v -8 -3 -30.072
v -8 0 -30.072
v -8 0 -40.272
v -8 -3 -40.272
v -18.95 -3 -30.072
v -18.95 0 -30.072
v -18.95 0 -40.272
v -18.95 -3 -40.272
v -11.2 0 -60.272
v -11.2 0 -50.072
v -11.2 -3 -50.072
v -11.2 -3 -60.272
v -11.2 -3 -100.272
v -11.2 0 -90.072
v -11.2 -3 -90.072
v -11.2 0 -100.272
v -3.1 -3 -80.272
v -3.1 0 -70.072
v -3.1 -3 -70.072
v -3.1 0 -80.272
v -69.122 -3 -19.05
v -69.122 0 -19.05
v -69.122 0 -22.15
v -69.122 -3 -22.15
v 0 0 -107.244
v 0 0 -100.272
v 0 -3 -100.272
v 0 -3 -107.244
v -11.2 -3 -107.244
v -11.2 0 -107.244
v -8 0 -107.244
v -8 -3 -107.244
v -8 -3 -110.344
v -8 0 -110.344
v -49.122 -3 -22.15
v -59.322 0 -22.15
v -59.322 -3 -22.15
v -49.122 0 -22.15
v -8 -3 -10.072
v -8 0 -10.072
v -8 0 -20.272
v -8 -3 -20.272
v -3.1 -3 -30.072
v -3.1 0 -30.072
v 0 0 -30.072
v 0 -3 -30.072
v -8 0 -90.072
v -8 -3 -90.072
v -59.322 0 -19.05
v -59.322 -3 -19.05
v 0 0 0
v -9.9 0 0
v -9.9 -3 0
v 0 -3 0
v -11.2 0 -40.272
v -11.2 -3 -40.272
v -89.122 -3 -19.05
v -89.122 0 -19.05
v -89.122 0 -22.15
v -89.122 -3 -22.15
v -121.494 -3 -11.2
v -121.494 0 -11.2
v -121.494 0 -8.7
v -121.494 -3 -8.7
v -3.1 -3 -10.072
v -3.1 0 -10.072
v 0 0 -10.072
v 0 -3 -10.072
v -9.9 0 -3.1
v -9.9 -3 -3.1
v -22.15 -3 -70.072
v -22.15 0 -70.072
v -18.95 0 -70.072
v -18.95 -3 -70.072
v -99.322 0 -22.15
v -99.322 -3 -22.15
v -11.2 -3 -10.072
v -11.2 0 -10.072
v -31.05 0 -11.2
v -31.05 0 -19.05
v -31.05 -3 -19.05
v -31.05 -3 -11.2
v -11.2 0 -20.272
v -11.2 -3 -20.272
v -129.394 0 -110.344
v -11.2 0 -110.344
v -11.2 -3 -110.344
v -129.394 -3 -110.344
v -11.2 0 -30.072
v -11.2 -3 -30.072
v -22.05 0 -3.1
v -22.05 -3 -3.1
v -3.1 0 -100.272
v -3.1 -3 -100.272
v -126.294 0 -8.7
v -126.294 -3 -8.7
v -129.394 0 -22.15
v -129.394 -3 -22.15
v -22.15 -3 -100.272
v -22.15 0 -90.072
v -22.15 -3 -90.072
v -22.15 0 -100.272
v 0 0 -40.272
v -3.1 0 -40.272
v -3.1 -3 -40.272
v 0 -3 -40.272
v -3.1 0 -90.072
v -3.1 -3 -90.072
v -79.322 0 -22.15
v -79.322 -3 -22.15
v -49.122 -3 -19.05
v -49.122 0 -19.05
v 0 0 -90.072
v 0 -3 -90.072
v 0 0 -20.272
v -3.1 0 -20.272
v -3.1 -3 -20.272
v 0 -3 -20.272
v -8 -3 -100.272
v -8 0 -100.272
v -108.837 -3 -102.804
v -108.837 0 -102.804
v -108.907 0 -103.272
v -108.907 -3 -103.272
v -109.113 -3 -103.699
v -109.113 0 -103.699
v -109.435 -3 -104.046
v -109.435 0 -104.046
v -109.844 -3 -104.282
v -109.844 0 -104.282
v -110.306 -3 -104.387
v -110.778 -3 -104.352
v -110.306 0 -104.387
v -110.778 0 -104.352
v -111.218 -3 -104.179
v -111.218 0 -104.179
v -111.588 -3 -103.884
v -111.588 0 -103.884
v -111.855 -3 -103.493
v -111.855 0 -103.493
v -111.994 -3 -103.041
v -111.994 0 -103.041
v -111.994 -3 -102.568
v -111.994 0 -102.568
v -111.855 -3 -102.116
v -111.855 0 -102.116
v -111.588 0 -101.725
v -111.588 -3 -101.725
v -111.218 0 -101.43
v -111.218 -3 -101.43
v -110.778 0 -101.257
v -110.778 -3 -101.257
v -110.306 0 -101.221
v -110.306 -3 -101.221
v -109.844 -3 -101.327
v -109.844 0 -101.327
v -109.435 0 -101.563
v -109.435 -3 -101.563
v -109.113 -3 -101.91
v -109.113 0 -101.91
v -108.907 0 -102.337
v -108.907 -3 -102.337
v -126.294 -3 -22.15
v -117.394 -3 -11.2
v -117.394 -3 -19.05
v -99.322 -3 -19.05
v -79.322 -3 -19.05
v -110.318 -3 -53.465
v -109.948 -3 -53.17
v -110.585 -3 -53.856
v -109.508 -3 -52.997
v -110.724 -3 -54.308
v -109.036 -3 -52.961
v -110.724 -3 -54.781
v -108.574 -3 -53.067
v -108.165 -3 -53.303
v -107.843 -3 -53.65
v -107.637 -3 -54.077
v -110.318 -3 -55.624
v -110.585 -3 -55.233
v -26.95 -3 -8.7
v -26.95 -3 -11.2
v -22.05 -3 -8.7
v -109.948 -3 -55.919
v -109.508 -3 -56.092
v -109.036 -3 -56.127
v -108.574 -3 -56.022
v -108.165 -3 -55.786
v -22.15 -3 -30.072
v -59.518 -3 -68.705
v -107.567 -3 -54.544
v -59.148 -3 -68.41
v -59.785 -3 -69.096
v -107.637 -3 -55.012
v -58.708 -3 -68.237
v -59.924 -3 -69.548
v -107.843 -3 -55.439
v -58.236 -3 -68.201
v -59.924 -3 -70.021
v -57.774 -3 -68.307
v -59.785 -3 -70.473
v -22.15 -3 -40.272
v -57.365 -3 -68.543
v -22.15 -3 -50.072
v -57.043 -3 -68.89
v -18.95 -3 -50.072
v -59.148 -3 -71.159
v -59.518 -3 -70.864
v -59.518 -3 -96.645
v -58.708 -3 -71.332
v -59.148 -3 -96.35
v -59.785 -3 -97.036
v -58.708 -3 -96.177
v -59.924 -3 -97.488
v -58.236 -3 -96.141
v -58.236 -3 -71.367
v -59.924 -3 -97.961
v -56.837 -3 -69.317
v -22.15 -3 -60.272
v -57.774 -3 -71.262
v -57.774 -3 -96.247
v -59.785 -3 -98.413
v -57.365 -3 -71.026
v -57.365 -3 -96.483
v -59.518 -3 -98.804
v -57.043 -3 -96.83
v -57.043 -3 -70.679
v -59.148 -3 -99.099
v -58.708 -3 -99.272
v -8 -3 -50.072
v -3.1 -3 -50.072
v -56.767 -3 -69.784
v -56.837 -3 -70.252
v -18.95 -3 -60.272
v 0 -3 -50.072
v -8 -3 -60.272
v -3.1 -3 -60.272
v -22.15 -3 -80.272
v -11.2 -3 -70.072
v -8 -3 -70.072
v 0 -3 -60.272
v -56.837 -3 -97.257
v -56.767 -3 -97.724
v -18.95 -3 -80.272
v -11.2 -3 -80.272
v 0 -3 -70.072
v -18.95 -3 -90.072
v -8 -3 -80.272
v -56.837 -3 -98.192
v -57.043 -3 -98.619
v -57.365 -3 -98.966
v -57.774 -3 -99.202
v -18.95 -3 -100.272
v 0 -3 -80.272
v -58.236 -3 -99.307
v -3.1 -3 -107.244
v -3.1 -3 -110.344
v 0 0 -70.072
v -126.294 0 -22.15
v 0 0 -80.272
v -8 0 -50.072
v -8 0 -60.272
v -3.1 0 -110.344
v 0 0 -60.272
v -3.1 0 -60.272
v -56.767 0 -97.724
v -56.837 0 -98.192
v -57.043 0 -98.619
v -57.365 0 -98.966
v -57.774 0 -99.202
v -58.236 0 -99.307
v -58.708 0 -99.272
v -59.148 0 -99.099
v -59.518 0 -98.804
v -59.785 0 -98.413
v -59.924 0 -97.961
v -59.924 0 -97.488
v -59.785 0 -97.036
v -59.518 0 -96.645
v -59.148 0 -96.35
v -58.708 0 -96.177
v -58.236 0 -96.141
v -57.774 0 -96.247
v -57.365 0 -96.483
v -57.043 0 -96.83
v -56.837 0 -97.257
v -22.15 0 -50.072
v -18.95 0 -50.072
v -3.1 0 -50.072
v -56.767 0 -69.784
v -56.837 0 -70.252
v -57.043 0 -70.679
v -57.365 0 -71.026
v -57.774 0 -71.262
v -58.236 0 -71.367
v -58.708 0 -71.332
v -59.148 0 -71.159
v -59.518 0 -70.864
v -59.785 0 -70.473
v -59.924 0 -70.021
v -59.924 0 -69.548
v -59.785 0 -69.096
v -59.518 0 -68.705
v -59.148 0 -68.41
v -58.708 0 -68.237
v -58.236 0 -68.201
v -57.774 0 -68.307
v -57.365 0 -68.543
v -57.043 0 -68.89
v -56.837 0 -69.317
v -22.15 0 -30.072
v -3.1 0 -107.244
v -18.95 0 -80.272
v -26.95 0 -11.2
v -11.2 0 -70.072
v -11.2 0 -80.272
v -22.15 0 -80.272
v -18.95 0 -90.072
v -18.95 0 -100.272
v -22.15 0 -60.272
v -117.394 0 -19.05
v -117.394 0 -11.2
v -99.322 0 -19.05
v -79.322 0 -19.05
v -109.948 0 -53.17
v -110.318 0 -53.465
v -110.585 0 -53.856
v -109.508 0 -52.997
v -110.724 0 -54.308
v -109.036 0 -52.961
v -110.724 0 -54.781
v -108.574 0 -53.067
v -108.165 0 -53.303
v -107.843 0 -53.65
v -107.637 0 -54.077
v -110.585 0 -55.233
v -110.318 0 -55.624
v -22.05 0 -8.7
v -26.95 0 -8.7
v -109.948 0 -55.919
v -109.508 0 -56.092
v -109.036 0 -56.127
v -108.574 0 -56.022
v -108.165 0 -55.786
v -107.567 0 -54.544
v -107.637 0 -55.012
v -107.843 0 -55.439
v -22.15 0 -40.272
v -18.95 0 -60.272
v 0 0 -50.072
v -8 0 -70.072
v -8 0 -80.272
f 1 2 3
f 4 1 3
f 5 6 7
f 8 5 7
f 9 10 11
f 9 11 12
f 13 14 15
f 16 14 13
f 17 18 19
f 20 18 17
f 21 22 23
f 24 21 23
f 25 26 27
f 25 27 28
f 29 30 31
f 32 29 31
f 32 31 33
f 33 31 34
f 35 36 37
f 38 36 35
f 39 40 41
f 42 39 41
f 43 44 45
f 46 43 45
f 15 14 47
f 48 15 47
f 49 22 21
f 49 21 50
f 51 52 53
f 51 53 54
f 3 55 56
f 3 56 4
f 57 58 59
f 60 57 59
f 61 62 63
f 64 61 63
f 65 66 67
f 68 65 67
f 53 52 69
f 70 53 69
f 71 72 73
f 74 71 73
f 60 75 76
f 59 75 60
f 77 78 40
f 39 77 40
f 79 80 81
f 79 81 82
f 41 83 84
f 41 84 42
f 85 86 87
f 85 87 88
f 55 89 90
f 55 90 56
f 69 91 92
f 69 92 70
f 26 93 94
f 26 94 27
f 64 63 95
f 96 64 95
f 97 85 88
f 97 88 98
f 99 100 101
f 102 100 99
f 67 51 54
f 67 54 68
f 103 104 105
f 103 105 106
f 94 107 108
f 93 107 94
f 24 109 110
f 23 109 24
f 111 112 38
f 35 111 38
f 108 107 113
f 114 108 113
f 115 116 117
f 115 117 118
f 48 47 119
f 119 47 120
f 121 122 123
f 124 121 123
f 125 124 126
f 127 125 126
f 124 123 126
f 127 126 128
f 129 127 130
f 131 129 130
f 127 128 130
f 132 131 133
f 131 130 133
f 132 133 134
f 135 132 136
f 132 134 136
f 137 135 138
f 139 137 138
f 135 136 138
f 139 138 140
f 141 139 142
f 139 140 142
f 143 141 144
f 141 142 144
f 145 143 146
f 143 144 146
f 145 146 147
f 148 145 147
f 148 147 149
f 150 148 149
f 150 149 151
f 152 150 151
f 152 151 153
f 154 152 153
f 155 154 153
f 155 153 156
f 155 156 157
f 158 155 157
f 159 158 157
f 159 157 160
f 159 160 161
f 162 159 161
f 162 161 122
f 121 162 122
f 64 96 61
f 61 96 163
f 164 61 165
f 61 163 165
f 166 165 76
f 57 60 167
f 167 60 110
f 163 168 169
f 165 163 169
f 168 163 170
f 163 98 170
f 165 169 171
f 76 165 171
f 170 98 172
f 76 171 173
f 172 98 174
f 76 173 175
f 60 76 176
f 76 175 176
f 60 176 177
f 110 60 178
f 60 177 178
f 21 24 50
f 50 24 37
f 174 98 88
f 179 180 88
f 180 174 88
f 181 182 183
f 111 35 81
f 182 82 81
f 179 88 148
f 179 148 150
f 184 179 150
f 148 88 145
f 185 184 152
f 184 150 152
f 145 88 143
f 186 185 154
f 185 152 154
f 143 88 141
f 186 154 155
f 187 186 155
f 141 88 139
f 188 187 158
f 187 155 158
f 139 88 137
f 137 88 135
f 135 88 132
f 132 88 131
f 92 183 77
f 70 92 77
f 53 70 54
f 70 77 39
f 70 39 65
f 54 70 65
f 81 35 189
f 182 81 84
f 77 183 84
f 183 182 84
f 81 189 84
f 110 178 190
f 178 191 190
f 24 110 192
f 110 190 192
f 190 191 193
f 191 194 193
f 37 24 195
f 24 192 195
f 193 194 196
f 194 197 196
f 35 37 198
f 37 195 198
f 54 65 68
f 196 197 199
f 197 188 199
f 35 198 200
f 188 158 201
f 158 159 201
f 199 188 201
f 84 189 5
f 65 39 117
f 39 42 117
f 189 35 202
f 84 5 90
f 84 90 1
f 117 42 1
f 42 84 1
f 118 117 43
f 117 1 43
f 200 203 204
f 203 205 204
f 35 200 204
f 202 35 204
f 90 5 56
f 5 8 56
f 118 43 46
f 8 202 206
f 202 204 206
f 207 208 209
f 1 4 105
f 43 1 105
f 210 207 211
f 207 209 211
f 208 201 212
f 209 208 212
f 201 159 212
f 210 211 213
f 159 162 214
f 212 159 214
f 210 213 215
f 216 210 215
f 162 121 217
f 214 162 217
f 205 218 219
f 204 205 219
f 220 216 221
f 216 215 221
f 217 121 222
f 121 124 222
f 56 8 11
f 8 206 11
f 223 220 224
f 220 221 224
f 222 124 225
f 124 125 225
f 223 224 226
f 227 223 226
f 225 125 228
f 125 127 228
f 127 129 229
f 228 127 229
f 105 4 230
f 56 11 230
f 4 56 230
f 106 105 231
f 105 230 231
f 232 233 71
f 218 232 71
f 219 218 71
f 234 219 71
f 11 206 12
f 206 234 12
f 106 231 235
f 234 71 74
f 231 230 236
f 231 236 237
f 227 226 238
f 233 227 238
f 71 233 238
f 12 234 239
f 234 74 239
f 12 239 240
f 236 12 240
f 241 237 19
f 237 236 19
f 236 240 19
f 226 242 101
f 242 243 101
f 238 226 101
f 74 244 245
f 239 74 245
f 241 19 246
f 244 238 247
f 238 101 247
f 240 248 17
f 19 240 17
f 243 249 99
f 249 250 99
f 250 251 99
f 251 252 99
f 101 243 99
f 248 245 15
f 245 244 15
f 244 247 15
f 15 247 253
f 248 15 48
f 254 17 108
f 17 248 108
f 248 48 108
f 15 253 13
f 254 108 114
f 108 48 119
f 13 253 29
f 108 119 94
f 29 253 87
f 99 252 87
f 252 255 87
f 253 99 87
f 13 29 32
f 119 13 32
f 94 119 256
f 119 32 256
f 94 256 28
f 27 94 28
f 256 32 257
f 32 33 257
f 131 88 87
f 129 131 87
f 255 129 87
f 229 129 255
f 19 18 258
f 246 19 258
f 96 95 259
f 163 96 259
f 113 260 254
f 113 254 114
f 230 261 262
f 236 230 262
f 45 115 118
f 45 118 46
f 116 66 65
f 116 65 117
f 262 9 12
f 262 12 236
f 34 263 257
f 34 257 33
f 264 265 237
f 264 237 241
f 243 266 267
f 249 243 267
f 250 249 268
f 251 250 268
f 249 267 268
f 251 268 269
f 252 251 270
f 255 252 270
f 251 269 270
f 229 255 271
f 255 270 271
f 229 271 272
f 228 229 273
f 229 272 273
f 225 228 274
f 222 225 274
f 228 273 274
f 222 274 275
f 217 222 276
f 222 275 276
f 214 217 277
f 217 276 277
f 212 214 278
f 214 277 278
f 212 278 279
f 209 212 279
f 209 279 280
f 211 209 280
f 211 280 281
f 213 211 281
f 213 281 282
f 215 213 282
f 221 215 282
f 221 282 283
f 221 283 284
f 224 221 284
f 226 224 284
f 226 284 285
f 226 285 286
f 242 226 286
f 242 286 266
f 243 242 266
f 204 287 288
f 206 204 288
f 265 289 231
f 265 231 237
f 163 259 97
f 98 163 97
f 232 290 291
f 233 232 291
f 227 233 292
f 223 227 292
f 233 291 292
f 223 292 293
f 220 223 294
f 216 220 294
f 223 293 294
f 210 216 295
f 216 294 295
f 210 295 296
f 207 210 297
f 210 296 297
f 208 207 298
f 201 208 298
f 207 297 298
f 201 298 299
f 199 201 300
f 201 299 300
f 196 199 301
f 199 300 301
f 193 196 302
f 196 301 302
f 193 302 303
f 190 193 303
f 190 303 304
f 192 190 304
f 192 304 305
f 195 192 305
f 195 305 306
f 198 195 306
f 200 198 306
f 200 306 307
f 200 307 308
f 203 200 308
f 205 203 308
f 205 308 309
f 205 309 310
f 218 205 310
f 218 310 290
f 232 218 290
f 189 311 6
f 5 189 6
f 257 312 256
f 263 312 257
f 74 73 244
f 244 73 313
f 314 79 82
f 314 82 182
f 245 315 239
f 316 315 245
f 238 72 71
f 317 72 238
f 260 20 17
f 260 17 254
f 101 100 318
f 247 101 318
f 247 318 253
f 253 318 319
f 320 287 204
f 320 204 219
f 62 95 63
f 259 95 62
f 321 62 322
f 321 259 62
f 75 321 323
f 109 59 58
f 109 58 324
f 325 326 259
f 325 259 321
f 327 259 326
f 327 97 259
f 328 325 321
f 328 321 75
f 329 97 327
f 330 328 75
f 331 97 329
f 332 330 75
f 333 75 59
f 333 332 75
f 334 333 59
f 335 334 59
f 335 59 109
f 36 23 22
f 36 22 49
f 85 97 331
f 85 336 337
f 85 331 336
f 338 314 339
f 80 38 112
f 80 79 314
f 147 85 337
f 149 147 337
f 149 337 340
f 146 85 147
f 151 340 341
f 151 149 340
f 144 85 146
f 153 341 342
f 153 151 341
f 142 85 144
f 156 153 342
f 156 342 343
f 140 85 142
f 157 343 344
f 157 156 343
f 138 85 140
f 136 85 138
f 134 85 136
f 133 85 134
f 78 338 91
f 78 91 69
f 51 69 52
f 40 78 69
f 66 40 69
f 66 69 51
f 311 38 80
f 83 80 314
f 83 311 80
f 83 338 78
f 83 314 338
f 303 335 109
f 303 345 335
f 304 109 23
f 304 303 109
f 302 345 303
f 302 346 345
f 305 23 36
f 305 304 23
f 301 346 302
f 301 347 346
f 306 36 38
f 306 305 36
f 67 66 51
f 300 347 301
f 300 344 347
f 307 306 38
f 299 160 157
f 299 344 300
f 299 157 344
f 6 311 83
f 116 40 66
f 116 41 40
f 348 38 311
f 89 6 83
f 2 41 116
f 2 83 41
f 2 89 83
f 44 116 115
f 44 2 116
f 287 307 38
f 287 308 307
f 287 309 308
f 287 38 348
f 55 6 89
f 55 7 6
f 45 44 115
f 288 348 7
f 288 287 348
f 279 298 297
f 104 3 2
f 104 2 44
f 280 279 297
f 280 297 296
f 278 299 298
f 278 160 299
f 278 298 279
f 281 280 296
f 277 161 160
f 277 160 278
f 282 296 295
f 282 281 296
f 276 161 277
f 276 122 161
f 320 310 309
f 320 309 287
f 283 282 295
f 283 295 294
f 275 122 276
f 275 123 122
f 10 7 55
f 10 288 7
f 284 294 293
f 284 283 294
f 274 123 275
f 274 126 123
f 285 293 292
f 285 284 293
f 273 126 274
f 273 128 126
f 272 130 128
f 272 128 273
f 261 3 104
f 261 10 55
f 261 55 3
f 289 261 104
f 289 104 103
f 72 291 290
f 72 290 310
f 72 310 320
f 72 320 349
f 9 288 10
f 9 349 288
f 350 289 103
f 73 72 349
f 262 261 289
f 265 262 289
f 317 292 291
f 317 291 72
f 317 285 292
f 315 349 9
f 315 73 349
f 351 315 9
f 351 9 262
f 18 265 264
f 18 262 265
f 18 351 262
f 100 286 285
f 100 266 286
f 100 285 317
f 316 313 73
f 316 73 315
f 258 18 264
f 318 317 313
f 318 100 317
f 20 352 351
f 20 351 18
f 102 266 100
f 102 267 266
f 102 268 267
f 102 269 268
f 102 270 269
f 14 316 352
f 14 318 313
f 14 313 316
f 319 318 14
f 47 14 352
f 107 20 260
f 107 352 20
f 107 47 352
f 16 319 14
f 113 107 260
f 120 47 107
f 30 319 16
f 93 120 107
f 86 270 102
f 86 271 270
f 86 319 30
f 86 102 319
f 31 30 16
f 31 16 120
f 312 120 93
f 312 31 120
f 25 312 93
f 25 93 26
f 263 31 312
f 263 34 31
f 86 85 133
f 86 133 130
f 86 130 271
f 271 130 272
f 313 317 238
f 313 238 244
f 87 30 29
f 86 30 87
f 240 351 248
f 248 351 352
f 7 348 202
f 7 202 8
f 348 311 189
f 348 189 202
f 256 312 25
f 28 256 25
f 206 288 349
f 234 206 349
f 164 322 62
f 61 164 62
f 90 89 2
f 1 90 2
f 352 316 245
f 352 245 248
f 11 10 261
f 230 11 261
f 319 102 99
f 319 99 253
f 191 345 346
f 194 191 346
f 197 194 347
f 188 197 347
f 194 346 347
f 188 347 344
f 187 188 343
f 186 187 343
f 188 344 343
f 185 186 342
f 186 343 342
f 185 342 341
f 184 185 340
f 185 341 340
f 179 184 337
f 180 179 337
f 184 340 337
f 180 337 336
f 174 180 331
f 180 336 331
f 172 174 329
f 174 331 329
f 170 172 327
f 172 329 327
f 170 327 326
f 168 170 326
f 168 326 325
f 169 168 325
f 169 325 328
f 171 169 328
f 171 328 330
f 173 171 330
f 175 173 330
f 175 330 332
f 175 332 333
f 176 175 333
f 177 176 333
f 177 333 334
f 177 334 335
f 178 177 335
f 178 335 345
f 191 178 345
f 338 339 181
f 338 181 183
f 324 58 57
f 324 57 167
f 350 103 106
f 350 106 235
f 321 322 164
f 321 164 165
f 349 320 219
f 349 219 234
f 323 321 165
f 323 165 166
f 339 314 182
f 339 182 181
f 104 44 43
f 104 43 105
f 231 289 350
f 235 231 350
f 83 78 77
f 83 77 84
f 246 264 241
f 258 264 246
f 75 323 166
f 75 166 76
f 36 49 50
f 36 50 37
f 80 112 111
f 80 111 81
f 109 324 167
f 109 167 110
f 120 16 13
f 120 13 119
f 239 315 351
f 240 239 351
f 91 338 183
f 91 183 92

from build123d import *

# Parameters (mm, degrees)
BOSS_EXTRUDE1_DEPTH = 3
SKETCH2_R           = 1.5875
CUT_EXTRUDE1_DEPTH  = 4
SKETCH4_W           = 10.2
SKETCH4_H           = 3.2
SKETCH4_W_2         = 3.2
SKETCH4_H_2         = 10.2
SKETCH4_W_3         = 12.25
CUT_EXTRUDE2_DEPTH  = 4


with BuildPart() as part:
    # Sketch1 → Boss-Extrude1 (new body)
    with BuildSketch(Plane(origin=(0, 0, 0), x_dir=(1, 0, 0), z_dir=(0, 1, 0))):
        Polygon((-129.394434203, 8.1), (-117.394434203, 8.1), (-117.394434203, 19.05), (-31.05, 19.05), (-31.05, 8.1), (-22.05, 8.1), (-22.05, 0), (0, 0), (0, 110.344434203), (-129.394434203, 110.344434203), align=None)
    extrude(amount=-BOSS_EXTRUDE1_DEPTH)

    # Sketch2 → Cut-Extrude1 (cut, through all)
    with BuildSketch(Plane(origin=(0, 0, 0), x_dir=(1, 0, 0), z_dir=(0, 1, 0))):
        with Locations((-58.354434203, 97.724434203)):
            Circle(SKETCH2_R)
        with Locations((-58.354434203, 69.784434203)):
            Circle(SKETCH2_R)
        with Locations((-110.424434203, 102.804434203)):
            Circle(SKETCH2_R)
        with Locations((-109.154434203, 54.544434203)):
            Circle(SKETCH2_R)
    extrude(amount=-CUT_EXTRUDE1_DEPTH, mode=Mode.SUBTRACT)

    # Sketch4 → Cut-Extrude2 (cut, through all)
    with BuildSketch(Plane(origin=(0, 0, 0), x_dir=(1, 0, 0), z_dir=(0, 1, 0))):
        Polygon((-126.294434203, 22.15), (-129.494434203, 22.15), (-129.494434203, 8), (-117.294434203, 8), (-117.294434203, 11.2), (-121.494434203, 11.2), (-121.494434203, 8.7), (-126.294434203, 8.7), align=None)
        with Locations((-74.222217102, 20.55)):
            Rectangle(SKETCH4_W, SKETCH4_H)
        with Locations((-94.222217102, 20.55)):
            Rectangle(SKETCH4_W, SKETCH4_H)
        with Locations((-54.222217102, 20.55)):
            Rectangle(SKETCH4_W, SKETCH4_H)
        Polygon((-26.95, 8.7), (-22.05, 8.7), (-22.05, 8), (-31.15, 8), (-31.15, 11.2), (-26.95, 11.2), align=None)
        with Locations((-9.6, 35.172217102)):
            Rectangle(SKETCH4_W_2, SKETCH4_H_2)
        with Locations((-16.025, 1.5)):
            Rectangle(SKETCH4_W_3, SKETCH4_H)
        with Locations((-9.6, 15.172217102)):
            Rectangle(SKETCH4_W_2, SKETCH4_H_2)
        with Locations((-1.5, 15.172217102)):
            Rectangle(SKETCH4_W_2, SKETCH4_H_2)
        with Locations((-1.5, 35.172217102)):
            Rectangle(SKETCH4_W_2, SKETCH4_H_2)
        with Locations((-20.55, 35.172217102)):
            Rectangle(SKETCH4_W_2, SKETCH4_H_2)
        with Locations((-1.5, 55.172217102)):
            Rectangle(SKETCH4_W_2, SKETCH4_H_2)
        with Locations((-20.55, 55.172217102)):
            Rectangle(SKETCH4_W_2, SKETCH4_H_2)
        with Locations((-1.5, 75.172217102)):
            Rectangle(SKETCH4_W_2, SKETCH4_H_2)
        with Locations((-20.55, 75.172217102)):
            Rectangle(SKETCH4_W_2, SKETCH4_H_2)
        with Locations((-1.5, 95.172217102)):
            Rectangle(SKETCH4_W_2, SKETCH4_H_2)
        with Locations((-20.55, 95.172217102)):
            Rectangle(SKETCH4_W_2, SKETCH4_H_2)
        with Locations((-9.6, 108.844434203)):
            Rectangle(SKETCH4_W_2, SKETCH4_H)
        with Locations((-1.5, 108.844434203)):
            Rectangle(SKETCH4_W_2, SKETCH4_H)
        with Locations((-9.6, 95.172217102)):
            Rectangle(SKETCH4_W_2, SKETCH4_H_2)
        with Locations((-9.6, 75.172217102)):
            Rectangle(SKETCH4_W_2, SKETCH4_H_2)
        with Locations((-9.6, 55.172217102)):
            Rectangle(SKETCH4_W_2, SKETCH4_H_2)
    extrude(amount=-CUT_EXTRUDE2_DEPTH, mode=Mode.SUBTRACT)


solid = part.part
